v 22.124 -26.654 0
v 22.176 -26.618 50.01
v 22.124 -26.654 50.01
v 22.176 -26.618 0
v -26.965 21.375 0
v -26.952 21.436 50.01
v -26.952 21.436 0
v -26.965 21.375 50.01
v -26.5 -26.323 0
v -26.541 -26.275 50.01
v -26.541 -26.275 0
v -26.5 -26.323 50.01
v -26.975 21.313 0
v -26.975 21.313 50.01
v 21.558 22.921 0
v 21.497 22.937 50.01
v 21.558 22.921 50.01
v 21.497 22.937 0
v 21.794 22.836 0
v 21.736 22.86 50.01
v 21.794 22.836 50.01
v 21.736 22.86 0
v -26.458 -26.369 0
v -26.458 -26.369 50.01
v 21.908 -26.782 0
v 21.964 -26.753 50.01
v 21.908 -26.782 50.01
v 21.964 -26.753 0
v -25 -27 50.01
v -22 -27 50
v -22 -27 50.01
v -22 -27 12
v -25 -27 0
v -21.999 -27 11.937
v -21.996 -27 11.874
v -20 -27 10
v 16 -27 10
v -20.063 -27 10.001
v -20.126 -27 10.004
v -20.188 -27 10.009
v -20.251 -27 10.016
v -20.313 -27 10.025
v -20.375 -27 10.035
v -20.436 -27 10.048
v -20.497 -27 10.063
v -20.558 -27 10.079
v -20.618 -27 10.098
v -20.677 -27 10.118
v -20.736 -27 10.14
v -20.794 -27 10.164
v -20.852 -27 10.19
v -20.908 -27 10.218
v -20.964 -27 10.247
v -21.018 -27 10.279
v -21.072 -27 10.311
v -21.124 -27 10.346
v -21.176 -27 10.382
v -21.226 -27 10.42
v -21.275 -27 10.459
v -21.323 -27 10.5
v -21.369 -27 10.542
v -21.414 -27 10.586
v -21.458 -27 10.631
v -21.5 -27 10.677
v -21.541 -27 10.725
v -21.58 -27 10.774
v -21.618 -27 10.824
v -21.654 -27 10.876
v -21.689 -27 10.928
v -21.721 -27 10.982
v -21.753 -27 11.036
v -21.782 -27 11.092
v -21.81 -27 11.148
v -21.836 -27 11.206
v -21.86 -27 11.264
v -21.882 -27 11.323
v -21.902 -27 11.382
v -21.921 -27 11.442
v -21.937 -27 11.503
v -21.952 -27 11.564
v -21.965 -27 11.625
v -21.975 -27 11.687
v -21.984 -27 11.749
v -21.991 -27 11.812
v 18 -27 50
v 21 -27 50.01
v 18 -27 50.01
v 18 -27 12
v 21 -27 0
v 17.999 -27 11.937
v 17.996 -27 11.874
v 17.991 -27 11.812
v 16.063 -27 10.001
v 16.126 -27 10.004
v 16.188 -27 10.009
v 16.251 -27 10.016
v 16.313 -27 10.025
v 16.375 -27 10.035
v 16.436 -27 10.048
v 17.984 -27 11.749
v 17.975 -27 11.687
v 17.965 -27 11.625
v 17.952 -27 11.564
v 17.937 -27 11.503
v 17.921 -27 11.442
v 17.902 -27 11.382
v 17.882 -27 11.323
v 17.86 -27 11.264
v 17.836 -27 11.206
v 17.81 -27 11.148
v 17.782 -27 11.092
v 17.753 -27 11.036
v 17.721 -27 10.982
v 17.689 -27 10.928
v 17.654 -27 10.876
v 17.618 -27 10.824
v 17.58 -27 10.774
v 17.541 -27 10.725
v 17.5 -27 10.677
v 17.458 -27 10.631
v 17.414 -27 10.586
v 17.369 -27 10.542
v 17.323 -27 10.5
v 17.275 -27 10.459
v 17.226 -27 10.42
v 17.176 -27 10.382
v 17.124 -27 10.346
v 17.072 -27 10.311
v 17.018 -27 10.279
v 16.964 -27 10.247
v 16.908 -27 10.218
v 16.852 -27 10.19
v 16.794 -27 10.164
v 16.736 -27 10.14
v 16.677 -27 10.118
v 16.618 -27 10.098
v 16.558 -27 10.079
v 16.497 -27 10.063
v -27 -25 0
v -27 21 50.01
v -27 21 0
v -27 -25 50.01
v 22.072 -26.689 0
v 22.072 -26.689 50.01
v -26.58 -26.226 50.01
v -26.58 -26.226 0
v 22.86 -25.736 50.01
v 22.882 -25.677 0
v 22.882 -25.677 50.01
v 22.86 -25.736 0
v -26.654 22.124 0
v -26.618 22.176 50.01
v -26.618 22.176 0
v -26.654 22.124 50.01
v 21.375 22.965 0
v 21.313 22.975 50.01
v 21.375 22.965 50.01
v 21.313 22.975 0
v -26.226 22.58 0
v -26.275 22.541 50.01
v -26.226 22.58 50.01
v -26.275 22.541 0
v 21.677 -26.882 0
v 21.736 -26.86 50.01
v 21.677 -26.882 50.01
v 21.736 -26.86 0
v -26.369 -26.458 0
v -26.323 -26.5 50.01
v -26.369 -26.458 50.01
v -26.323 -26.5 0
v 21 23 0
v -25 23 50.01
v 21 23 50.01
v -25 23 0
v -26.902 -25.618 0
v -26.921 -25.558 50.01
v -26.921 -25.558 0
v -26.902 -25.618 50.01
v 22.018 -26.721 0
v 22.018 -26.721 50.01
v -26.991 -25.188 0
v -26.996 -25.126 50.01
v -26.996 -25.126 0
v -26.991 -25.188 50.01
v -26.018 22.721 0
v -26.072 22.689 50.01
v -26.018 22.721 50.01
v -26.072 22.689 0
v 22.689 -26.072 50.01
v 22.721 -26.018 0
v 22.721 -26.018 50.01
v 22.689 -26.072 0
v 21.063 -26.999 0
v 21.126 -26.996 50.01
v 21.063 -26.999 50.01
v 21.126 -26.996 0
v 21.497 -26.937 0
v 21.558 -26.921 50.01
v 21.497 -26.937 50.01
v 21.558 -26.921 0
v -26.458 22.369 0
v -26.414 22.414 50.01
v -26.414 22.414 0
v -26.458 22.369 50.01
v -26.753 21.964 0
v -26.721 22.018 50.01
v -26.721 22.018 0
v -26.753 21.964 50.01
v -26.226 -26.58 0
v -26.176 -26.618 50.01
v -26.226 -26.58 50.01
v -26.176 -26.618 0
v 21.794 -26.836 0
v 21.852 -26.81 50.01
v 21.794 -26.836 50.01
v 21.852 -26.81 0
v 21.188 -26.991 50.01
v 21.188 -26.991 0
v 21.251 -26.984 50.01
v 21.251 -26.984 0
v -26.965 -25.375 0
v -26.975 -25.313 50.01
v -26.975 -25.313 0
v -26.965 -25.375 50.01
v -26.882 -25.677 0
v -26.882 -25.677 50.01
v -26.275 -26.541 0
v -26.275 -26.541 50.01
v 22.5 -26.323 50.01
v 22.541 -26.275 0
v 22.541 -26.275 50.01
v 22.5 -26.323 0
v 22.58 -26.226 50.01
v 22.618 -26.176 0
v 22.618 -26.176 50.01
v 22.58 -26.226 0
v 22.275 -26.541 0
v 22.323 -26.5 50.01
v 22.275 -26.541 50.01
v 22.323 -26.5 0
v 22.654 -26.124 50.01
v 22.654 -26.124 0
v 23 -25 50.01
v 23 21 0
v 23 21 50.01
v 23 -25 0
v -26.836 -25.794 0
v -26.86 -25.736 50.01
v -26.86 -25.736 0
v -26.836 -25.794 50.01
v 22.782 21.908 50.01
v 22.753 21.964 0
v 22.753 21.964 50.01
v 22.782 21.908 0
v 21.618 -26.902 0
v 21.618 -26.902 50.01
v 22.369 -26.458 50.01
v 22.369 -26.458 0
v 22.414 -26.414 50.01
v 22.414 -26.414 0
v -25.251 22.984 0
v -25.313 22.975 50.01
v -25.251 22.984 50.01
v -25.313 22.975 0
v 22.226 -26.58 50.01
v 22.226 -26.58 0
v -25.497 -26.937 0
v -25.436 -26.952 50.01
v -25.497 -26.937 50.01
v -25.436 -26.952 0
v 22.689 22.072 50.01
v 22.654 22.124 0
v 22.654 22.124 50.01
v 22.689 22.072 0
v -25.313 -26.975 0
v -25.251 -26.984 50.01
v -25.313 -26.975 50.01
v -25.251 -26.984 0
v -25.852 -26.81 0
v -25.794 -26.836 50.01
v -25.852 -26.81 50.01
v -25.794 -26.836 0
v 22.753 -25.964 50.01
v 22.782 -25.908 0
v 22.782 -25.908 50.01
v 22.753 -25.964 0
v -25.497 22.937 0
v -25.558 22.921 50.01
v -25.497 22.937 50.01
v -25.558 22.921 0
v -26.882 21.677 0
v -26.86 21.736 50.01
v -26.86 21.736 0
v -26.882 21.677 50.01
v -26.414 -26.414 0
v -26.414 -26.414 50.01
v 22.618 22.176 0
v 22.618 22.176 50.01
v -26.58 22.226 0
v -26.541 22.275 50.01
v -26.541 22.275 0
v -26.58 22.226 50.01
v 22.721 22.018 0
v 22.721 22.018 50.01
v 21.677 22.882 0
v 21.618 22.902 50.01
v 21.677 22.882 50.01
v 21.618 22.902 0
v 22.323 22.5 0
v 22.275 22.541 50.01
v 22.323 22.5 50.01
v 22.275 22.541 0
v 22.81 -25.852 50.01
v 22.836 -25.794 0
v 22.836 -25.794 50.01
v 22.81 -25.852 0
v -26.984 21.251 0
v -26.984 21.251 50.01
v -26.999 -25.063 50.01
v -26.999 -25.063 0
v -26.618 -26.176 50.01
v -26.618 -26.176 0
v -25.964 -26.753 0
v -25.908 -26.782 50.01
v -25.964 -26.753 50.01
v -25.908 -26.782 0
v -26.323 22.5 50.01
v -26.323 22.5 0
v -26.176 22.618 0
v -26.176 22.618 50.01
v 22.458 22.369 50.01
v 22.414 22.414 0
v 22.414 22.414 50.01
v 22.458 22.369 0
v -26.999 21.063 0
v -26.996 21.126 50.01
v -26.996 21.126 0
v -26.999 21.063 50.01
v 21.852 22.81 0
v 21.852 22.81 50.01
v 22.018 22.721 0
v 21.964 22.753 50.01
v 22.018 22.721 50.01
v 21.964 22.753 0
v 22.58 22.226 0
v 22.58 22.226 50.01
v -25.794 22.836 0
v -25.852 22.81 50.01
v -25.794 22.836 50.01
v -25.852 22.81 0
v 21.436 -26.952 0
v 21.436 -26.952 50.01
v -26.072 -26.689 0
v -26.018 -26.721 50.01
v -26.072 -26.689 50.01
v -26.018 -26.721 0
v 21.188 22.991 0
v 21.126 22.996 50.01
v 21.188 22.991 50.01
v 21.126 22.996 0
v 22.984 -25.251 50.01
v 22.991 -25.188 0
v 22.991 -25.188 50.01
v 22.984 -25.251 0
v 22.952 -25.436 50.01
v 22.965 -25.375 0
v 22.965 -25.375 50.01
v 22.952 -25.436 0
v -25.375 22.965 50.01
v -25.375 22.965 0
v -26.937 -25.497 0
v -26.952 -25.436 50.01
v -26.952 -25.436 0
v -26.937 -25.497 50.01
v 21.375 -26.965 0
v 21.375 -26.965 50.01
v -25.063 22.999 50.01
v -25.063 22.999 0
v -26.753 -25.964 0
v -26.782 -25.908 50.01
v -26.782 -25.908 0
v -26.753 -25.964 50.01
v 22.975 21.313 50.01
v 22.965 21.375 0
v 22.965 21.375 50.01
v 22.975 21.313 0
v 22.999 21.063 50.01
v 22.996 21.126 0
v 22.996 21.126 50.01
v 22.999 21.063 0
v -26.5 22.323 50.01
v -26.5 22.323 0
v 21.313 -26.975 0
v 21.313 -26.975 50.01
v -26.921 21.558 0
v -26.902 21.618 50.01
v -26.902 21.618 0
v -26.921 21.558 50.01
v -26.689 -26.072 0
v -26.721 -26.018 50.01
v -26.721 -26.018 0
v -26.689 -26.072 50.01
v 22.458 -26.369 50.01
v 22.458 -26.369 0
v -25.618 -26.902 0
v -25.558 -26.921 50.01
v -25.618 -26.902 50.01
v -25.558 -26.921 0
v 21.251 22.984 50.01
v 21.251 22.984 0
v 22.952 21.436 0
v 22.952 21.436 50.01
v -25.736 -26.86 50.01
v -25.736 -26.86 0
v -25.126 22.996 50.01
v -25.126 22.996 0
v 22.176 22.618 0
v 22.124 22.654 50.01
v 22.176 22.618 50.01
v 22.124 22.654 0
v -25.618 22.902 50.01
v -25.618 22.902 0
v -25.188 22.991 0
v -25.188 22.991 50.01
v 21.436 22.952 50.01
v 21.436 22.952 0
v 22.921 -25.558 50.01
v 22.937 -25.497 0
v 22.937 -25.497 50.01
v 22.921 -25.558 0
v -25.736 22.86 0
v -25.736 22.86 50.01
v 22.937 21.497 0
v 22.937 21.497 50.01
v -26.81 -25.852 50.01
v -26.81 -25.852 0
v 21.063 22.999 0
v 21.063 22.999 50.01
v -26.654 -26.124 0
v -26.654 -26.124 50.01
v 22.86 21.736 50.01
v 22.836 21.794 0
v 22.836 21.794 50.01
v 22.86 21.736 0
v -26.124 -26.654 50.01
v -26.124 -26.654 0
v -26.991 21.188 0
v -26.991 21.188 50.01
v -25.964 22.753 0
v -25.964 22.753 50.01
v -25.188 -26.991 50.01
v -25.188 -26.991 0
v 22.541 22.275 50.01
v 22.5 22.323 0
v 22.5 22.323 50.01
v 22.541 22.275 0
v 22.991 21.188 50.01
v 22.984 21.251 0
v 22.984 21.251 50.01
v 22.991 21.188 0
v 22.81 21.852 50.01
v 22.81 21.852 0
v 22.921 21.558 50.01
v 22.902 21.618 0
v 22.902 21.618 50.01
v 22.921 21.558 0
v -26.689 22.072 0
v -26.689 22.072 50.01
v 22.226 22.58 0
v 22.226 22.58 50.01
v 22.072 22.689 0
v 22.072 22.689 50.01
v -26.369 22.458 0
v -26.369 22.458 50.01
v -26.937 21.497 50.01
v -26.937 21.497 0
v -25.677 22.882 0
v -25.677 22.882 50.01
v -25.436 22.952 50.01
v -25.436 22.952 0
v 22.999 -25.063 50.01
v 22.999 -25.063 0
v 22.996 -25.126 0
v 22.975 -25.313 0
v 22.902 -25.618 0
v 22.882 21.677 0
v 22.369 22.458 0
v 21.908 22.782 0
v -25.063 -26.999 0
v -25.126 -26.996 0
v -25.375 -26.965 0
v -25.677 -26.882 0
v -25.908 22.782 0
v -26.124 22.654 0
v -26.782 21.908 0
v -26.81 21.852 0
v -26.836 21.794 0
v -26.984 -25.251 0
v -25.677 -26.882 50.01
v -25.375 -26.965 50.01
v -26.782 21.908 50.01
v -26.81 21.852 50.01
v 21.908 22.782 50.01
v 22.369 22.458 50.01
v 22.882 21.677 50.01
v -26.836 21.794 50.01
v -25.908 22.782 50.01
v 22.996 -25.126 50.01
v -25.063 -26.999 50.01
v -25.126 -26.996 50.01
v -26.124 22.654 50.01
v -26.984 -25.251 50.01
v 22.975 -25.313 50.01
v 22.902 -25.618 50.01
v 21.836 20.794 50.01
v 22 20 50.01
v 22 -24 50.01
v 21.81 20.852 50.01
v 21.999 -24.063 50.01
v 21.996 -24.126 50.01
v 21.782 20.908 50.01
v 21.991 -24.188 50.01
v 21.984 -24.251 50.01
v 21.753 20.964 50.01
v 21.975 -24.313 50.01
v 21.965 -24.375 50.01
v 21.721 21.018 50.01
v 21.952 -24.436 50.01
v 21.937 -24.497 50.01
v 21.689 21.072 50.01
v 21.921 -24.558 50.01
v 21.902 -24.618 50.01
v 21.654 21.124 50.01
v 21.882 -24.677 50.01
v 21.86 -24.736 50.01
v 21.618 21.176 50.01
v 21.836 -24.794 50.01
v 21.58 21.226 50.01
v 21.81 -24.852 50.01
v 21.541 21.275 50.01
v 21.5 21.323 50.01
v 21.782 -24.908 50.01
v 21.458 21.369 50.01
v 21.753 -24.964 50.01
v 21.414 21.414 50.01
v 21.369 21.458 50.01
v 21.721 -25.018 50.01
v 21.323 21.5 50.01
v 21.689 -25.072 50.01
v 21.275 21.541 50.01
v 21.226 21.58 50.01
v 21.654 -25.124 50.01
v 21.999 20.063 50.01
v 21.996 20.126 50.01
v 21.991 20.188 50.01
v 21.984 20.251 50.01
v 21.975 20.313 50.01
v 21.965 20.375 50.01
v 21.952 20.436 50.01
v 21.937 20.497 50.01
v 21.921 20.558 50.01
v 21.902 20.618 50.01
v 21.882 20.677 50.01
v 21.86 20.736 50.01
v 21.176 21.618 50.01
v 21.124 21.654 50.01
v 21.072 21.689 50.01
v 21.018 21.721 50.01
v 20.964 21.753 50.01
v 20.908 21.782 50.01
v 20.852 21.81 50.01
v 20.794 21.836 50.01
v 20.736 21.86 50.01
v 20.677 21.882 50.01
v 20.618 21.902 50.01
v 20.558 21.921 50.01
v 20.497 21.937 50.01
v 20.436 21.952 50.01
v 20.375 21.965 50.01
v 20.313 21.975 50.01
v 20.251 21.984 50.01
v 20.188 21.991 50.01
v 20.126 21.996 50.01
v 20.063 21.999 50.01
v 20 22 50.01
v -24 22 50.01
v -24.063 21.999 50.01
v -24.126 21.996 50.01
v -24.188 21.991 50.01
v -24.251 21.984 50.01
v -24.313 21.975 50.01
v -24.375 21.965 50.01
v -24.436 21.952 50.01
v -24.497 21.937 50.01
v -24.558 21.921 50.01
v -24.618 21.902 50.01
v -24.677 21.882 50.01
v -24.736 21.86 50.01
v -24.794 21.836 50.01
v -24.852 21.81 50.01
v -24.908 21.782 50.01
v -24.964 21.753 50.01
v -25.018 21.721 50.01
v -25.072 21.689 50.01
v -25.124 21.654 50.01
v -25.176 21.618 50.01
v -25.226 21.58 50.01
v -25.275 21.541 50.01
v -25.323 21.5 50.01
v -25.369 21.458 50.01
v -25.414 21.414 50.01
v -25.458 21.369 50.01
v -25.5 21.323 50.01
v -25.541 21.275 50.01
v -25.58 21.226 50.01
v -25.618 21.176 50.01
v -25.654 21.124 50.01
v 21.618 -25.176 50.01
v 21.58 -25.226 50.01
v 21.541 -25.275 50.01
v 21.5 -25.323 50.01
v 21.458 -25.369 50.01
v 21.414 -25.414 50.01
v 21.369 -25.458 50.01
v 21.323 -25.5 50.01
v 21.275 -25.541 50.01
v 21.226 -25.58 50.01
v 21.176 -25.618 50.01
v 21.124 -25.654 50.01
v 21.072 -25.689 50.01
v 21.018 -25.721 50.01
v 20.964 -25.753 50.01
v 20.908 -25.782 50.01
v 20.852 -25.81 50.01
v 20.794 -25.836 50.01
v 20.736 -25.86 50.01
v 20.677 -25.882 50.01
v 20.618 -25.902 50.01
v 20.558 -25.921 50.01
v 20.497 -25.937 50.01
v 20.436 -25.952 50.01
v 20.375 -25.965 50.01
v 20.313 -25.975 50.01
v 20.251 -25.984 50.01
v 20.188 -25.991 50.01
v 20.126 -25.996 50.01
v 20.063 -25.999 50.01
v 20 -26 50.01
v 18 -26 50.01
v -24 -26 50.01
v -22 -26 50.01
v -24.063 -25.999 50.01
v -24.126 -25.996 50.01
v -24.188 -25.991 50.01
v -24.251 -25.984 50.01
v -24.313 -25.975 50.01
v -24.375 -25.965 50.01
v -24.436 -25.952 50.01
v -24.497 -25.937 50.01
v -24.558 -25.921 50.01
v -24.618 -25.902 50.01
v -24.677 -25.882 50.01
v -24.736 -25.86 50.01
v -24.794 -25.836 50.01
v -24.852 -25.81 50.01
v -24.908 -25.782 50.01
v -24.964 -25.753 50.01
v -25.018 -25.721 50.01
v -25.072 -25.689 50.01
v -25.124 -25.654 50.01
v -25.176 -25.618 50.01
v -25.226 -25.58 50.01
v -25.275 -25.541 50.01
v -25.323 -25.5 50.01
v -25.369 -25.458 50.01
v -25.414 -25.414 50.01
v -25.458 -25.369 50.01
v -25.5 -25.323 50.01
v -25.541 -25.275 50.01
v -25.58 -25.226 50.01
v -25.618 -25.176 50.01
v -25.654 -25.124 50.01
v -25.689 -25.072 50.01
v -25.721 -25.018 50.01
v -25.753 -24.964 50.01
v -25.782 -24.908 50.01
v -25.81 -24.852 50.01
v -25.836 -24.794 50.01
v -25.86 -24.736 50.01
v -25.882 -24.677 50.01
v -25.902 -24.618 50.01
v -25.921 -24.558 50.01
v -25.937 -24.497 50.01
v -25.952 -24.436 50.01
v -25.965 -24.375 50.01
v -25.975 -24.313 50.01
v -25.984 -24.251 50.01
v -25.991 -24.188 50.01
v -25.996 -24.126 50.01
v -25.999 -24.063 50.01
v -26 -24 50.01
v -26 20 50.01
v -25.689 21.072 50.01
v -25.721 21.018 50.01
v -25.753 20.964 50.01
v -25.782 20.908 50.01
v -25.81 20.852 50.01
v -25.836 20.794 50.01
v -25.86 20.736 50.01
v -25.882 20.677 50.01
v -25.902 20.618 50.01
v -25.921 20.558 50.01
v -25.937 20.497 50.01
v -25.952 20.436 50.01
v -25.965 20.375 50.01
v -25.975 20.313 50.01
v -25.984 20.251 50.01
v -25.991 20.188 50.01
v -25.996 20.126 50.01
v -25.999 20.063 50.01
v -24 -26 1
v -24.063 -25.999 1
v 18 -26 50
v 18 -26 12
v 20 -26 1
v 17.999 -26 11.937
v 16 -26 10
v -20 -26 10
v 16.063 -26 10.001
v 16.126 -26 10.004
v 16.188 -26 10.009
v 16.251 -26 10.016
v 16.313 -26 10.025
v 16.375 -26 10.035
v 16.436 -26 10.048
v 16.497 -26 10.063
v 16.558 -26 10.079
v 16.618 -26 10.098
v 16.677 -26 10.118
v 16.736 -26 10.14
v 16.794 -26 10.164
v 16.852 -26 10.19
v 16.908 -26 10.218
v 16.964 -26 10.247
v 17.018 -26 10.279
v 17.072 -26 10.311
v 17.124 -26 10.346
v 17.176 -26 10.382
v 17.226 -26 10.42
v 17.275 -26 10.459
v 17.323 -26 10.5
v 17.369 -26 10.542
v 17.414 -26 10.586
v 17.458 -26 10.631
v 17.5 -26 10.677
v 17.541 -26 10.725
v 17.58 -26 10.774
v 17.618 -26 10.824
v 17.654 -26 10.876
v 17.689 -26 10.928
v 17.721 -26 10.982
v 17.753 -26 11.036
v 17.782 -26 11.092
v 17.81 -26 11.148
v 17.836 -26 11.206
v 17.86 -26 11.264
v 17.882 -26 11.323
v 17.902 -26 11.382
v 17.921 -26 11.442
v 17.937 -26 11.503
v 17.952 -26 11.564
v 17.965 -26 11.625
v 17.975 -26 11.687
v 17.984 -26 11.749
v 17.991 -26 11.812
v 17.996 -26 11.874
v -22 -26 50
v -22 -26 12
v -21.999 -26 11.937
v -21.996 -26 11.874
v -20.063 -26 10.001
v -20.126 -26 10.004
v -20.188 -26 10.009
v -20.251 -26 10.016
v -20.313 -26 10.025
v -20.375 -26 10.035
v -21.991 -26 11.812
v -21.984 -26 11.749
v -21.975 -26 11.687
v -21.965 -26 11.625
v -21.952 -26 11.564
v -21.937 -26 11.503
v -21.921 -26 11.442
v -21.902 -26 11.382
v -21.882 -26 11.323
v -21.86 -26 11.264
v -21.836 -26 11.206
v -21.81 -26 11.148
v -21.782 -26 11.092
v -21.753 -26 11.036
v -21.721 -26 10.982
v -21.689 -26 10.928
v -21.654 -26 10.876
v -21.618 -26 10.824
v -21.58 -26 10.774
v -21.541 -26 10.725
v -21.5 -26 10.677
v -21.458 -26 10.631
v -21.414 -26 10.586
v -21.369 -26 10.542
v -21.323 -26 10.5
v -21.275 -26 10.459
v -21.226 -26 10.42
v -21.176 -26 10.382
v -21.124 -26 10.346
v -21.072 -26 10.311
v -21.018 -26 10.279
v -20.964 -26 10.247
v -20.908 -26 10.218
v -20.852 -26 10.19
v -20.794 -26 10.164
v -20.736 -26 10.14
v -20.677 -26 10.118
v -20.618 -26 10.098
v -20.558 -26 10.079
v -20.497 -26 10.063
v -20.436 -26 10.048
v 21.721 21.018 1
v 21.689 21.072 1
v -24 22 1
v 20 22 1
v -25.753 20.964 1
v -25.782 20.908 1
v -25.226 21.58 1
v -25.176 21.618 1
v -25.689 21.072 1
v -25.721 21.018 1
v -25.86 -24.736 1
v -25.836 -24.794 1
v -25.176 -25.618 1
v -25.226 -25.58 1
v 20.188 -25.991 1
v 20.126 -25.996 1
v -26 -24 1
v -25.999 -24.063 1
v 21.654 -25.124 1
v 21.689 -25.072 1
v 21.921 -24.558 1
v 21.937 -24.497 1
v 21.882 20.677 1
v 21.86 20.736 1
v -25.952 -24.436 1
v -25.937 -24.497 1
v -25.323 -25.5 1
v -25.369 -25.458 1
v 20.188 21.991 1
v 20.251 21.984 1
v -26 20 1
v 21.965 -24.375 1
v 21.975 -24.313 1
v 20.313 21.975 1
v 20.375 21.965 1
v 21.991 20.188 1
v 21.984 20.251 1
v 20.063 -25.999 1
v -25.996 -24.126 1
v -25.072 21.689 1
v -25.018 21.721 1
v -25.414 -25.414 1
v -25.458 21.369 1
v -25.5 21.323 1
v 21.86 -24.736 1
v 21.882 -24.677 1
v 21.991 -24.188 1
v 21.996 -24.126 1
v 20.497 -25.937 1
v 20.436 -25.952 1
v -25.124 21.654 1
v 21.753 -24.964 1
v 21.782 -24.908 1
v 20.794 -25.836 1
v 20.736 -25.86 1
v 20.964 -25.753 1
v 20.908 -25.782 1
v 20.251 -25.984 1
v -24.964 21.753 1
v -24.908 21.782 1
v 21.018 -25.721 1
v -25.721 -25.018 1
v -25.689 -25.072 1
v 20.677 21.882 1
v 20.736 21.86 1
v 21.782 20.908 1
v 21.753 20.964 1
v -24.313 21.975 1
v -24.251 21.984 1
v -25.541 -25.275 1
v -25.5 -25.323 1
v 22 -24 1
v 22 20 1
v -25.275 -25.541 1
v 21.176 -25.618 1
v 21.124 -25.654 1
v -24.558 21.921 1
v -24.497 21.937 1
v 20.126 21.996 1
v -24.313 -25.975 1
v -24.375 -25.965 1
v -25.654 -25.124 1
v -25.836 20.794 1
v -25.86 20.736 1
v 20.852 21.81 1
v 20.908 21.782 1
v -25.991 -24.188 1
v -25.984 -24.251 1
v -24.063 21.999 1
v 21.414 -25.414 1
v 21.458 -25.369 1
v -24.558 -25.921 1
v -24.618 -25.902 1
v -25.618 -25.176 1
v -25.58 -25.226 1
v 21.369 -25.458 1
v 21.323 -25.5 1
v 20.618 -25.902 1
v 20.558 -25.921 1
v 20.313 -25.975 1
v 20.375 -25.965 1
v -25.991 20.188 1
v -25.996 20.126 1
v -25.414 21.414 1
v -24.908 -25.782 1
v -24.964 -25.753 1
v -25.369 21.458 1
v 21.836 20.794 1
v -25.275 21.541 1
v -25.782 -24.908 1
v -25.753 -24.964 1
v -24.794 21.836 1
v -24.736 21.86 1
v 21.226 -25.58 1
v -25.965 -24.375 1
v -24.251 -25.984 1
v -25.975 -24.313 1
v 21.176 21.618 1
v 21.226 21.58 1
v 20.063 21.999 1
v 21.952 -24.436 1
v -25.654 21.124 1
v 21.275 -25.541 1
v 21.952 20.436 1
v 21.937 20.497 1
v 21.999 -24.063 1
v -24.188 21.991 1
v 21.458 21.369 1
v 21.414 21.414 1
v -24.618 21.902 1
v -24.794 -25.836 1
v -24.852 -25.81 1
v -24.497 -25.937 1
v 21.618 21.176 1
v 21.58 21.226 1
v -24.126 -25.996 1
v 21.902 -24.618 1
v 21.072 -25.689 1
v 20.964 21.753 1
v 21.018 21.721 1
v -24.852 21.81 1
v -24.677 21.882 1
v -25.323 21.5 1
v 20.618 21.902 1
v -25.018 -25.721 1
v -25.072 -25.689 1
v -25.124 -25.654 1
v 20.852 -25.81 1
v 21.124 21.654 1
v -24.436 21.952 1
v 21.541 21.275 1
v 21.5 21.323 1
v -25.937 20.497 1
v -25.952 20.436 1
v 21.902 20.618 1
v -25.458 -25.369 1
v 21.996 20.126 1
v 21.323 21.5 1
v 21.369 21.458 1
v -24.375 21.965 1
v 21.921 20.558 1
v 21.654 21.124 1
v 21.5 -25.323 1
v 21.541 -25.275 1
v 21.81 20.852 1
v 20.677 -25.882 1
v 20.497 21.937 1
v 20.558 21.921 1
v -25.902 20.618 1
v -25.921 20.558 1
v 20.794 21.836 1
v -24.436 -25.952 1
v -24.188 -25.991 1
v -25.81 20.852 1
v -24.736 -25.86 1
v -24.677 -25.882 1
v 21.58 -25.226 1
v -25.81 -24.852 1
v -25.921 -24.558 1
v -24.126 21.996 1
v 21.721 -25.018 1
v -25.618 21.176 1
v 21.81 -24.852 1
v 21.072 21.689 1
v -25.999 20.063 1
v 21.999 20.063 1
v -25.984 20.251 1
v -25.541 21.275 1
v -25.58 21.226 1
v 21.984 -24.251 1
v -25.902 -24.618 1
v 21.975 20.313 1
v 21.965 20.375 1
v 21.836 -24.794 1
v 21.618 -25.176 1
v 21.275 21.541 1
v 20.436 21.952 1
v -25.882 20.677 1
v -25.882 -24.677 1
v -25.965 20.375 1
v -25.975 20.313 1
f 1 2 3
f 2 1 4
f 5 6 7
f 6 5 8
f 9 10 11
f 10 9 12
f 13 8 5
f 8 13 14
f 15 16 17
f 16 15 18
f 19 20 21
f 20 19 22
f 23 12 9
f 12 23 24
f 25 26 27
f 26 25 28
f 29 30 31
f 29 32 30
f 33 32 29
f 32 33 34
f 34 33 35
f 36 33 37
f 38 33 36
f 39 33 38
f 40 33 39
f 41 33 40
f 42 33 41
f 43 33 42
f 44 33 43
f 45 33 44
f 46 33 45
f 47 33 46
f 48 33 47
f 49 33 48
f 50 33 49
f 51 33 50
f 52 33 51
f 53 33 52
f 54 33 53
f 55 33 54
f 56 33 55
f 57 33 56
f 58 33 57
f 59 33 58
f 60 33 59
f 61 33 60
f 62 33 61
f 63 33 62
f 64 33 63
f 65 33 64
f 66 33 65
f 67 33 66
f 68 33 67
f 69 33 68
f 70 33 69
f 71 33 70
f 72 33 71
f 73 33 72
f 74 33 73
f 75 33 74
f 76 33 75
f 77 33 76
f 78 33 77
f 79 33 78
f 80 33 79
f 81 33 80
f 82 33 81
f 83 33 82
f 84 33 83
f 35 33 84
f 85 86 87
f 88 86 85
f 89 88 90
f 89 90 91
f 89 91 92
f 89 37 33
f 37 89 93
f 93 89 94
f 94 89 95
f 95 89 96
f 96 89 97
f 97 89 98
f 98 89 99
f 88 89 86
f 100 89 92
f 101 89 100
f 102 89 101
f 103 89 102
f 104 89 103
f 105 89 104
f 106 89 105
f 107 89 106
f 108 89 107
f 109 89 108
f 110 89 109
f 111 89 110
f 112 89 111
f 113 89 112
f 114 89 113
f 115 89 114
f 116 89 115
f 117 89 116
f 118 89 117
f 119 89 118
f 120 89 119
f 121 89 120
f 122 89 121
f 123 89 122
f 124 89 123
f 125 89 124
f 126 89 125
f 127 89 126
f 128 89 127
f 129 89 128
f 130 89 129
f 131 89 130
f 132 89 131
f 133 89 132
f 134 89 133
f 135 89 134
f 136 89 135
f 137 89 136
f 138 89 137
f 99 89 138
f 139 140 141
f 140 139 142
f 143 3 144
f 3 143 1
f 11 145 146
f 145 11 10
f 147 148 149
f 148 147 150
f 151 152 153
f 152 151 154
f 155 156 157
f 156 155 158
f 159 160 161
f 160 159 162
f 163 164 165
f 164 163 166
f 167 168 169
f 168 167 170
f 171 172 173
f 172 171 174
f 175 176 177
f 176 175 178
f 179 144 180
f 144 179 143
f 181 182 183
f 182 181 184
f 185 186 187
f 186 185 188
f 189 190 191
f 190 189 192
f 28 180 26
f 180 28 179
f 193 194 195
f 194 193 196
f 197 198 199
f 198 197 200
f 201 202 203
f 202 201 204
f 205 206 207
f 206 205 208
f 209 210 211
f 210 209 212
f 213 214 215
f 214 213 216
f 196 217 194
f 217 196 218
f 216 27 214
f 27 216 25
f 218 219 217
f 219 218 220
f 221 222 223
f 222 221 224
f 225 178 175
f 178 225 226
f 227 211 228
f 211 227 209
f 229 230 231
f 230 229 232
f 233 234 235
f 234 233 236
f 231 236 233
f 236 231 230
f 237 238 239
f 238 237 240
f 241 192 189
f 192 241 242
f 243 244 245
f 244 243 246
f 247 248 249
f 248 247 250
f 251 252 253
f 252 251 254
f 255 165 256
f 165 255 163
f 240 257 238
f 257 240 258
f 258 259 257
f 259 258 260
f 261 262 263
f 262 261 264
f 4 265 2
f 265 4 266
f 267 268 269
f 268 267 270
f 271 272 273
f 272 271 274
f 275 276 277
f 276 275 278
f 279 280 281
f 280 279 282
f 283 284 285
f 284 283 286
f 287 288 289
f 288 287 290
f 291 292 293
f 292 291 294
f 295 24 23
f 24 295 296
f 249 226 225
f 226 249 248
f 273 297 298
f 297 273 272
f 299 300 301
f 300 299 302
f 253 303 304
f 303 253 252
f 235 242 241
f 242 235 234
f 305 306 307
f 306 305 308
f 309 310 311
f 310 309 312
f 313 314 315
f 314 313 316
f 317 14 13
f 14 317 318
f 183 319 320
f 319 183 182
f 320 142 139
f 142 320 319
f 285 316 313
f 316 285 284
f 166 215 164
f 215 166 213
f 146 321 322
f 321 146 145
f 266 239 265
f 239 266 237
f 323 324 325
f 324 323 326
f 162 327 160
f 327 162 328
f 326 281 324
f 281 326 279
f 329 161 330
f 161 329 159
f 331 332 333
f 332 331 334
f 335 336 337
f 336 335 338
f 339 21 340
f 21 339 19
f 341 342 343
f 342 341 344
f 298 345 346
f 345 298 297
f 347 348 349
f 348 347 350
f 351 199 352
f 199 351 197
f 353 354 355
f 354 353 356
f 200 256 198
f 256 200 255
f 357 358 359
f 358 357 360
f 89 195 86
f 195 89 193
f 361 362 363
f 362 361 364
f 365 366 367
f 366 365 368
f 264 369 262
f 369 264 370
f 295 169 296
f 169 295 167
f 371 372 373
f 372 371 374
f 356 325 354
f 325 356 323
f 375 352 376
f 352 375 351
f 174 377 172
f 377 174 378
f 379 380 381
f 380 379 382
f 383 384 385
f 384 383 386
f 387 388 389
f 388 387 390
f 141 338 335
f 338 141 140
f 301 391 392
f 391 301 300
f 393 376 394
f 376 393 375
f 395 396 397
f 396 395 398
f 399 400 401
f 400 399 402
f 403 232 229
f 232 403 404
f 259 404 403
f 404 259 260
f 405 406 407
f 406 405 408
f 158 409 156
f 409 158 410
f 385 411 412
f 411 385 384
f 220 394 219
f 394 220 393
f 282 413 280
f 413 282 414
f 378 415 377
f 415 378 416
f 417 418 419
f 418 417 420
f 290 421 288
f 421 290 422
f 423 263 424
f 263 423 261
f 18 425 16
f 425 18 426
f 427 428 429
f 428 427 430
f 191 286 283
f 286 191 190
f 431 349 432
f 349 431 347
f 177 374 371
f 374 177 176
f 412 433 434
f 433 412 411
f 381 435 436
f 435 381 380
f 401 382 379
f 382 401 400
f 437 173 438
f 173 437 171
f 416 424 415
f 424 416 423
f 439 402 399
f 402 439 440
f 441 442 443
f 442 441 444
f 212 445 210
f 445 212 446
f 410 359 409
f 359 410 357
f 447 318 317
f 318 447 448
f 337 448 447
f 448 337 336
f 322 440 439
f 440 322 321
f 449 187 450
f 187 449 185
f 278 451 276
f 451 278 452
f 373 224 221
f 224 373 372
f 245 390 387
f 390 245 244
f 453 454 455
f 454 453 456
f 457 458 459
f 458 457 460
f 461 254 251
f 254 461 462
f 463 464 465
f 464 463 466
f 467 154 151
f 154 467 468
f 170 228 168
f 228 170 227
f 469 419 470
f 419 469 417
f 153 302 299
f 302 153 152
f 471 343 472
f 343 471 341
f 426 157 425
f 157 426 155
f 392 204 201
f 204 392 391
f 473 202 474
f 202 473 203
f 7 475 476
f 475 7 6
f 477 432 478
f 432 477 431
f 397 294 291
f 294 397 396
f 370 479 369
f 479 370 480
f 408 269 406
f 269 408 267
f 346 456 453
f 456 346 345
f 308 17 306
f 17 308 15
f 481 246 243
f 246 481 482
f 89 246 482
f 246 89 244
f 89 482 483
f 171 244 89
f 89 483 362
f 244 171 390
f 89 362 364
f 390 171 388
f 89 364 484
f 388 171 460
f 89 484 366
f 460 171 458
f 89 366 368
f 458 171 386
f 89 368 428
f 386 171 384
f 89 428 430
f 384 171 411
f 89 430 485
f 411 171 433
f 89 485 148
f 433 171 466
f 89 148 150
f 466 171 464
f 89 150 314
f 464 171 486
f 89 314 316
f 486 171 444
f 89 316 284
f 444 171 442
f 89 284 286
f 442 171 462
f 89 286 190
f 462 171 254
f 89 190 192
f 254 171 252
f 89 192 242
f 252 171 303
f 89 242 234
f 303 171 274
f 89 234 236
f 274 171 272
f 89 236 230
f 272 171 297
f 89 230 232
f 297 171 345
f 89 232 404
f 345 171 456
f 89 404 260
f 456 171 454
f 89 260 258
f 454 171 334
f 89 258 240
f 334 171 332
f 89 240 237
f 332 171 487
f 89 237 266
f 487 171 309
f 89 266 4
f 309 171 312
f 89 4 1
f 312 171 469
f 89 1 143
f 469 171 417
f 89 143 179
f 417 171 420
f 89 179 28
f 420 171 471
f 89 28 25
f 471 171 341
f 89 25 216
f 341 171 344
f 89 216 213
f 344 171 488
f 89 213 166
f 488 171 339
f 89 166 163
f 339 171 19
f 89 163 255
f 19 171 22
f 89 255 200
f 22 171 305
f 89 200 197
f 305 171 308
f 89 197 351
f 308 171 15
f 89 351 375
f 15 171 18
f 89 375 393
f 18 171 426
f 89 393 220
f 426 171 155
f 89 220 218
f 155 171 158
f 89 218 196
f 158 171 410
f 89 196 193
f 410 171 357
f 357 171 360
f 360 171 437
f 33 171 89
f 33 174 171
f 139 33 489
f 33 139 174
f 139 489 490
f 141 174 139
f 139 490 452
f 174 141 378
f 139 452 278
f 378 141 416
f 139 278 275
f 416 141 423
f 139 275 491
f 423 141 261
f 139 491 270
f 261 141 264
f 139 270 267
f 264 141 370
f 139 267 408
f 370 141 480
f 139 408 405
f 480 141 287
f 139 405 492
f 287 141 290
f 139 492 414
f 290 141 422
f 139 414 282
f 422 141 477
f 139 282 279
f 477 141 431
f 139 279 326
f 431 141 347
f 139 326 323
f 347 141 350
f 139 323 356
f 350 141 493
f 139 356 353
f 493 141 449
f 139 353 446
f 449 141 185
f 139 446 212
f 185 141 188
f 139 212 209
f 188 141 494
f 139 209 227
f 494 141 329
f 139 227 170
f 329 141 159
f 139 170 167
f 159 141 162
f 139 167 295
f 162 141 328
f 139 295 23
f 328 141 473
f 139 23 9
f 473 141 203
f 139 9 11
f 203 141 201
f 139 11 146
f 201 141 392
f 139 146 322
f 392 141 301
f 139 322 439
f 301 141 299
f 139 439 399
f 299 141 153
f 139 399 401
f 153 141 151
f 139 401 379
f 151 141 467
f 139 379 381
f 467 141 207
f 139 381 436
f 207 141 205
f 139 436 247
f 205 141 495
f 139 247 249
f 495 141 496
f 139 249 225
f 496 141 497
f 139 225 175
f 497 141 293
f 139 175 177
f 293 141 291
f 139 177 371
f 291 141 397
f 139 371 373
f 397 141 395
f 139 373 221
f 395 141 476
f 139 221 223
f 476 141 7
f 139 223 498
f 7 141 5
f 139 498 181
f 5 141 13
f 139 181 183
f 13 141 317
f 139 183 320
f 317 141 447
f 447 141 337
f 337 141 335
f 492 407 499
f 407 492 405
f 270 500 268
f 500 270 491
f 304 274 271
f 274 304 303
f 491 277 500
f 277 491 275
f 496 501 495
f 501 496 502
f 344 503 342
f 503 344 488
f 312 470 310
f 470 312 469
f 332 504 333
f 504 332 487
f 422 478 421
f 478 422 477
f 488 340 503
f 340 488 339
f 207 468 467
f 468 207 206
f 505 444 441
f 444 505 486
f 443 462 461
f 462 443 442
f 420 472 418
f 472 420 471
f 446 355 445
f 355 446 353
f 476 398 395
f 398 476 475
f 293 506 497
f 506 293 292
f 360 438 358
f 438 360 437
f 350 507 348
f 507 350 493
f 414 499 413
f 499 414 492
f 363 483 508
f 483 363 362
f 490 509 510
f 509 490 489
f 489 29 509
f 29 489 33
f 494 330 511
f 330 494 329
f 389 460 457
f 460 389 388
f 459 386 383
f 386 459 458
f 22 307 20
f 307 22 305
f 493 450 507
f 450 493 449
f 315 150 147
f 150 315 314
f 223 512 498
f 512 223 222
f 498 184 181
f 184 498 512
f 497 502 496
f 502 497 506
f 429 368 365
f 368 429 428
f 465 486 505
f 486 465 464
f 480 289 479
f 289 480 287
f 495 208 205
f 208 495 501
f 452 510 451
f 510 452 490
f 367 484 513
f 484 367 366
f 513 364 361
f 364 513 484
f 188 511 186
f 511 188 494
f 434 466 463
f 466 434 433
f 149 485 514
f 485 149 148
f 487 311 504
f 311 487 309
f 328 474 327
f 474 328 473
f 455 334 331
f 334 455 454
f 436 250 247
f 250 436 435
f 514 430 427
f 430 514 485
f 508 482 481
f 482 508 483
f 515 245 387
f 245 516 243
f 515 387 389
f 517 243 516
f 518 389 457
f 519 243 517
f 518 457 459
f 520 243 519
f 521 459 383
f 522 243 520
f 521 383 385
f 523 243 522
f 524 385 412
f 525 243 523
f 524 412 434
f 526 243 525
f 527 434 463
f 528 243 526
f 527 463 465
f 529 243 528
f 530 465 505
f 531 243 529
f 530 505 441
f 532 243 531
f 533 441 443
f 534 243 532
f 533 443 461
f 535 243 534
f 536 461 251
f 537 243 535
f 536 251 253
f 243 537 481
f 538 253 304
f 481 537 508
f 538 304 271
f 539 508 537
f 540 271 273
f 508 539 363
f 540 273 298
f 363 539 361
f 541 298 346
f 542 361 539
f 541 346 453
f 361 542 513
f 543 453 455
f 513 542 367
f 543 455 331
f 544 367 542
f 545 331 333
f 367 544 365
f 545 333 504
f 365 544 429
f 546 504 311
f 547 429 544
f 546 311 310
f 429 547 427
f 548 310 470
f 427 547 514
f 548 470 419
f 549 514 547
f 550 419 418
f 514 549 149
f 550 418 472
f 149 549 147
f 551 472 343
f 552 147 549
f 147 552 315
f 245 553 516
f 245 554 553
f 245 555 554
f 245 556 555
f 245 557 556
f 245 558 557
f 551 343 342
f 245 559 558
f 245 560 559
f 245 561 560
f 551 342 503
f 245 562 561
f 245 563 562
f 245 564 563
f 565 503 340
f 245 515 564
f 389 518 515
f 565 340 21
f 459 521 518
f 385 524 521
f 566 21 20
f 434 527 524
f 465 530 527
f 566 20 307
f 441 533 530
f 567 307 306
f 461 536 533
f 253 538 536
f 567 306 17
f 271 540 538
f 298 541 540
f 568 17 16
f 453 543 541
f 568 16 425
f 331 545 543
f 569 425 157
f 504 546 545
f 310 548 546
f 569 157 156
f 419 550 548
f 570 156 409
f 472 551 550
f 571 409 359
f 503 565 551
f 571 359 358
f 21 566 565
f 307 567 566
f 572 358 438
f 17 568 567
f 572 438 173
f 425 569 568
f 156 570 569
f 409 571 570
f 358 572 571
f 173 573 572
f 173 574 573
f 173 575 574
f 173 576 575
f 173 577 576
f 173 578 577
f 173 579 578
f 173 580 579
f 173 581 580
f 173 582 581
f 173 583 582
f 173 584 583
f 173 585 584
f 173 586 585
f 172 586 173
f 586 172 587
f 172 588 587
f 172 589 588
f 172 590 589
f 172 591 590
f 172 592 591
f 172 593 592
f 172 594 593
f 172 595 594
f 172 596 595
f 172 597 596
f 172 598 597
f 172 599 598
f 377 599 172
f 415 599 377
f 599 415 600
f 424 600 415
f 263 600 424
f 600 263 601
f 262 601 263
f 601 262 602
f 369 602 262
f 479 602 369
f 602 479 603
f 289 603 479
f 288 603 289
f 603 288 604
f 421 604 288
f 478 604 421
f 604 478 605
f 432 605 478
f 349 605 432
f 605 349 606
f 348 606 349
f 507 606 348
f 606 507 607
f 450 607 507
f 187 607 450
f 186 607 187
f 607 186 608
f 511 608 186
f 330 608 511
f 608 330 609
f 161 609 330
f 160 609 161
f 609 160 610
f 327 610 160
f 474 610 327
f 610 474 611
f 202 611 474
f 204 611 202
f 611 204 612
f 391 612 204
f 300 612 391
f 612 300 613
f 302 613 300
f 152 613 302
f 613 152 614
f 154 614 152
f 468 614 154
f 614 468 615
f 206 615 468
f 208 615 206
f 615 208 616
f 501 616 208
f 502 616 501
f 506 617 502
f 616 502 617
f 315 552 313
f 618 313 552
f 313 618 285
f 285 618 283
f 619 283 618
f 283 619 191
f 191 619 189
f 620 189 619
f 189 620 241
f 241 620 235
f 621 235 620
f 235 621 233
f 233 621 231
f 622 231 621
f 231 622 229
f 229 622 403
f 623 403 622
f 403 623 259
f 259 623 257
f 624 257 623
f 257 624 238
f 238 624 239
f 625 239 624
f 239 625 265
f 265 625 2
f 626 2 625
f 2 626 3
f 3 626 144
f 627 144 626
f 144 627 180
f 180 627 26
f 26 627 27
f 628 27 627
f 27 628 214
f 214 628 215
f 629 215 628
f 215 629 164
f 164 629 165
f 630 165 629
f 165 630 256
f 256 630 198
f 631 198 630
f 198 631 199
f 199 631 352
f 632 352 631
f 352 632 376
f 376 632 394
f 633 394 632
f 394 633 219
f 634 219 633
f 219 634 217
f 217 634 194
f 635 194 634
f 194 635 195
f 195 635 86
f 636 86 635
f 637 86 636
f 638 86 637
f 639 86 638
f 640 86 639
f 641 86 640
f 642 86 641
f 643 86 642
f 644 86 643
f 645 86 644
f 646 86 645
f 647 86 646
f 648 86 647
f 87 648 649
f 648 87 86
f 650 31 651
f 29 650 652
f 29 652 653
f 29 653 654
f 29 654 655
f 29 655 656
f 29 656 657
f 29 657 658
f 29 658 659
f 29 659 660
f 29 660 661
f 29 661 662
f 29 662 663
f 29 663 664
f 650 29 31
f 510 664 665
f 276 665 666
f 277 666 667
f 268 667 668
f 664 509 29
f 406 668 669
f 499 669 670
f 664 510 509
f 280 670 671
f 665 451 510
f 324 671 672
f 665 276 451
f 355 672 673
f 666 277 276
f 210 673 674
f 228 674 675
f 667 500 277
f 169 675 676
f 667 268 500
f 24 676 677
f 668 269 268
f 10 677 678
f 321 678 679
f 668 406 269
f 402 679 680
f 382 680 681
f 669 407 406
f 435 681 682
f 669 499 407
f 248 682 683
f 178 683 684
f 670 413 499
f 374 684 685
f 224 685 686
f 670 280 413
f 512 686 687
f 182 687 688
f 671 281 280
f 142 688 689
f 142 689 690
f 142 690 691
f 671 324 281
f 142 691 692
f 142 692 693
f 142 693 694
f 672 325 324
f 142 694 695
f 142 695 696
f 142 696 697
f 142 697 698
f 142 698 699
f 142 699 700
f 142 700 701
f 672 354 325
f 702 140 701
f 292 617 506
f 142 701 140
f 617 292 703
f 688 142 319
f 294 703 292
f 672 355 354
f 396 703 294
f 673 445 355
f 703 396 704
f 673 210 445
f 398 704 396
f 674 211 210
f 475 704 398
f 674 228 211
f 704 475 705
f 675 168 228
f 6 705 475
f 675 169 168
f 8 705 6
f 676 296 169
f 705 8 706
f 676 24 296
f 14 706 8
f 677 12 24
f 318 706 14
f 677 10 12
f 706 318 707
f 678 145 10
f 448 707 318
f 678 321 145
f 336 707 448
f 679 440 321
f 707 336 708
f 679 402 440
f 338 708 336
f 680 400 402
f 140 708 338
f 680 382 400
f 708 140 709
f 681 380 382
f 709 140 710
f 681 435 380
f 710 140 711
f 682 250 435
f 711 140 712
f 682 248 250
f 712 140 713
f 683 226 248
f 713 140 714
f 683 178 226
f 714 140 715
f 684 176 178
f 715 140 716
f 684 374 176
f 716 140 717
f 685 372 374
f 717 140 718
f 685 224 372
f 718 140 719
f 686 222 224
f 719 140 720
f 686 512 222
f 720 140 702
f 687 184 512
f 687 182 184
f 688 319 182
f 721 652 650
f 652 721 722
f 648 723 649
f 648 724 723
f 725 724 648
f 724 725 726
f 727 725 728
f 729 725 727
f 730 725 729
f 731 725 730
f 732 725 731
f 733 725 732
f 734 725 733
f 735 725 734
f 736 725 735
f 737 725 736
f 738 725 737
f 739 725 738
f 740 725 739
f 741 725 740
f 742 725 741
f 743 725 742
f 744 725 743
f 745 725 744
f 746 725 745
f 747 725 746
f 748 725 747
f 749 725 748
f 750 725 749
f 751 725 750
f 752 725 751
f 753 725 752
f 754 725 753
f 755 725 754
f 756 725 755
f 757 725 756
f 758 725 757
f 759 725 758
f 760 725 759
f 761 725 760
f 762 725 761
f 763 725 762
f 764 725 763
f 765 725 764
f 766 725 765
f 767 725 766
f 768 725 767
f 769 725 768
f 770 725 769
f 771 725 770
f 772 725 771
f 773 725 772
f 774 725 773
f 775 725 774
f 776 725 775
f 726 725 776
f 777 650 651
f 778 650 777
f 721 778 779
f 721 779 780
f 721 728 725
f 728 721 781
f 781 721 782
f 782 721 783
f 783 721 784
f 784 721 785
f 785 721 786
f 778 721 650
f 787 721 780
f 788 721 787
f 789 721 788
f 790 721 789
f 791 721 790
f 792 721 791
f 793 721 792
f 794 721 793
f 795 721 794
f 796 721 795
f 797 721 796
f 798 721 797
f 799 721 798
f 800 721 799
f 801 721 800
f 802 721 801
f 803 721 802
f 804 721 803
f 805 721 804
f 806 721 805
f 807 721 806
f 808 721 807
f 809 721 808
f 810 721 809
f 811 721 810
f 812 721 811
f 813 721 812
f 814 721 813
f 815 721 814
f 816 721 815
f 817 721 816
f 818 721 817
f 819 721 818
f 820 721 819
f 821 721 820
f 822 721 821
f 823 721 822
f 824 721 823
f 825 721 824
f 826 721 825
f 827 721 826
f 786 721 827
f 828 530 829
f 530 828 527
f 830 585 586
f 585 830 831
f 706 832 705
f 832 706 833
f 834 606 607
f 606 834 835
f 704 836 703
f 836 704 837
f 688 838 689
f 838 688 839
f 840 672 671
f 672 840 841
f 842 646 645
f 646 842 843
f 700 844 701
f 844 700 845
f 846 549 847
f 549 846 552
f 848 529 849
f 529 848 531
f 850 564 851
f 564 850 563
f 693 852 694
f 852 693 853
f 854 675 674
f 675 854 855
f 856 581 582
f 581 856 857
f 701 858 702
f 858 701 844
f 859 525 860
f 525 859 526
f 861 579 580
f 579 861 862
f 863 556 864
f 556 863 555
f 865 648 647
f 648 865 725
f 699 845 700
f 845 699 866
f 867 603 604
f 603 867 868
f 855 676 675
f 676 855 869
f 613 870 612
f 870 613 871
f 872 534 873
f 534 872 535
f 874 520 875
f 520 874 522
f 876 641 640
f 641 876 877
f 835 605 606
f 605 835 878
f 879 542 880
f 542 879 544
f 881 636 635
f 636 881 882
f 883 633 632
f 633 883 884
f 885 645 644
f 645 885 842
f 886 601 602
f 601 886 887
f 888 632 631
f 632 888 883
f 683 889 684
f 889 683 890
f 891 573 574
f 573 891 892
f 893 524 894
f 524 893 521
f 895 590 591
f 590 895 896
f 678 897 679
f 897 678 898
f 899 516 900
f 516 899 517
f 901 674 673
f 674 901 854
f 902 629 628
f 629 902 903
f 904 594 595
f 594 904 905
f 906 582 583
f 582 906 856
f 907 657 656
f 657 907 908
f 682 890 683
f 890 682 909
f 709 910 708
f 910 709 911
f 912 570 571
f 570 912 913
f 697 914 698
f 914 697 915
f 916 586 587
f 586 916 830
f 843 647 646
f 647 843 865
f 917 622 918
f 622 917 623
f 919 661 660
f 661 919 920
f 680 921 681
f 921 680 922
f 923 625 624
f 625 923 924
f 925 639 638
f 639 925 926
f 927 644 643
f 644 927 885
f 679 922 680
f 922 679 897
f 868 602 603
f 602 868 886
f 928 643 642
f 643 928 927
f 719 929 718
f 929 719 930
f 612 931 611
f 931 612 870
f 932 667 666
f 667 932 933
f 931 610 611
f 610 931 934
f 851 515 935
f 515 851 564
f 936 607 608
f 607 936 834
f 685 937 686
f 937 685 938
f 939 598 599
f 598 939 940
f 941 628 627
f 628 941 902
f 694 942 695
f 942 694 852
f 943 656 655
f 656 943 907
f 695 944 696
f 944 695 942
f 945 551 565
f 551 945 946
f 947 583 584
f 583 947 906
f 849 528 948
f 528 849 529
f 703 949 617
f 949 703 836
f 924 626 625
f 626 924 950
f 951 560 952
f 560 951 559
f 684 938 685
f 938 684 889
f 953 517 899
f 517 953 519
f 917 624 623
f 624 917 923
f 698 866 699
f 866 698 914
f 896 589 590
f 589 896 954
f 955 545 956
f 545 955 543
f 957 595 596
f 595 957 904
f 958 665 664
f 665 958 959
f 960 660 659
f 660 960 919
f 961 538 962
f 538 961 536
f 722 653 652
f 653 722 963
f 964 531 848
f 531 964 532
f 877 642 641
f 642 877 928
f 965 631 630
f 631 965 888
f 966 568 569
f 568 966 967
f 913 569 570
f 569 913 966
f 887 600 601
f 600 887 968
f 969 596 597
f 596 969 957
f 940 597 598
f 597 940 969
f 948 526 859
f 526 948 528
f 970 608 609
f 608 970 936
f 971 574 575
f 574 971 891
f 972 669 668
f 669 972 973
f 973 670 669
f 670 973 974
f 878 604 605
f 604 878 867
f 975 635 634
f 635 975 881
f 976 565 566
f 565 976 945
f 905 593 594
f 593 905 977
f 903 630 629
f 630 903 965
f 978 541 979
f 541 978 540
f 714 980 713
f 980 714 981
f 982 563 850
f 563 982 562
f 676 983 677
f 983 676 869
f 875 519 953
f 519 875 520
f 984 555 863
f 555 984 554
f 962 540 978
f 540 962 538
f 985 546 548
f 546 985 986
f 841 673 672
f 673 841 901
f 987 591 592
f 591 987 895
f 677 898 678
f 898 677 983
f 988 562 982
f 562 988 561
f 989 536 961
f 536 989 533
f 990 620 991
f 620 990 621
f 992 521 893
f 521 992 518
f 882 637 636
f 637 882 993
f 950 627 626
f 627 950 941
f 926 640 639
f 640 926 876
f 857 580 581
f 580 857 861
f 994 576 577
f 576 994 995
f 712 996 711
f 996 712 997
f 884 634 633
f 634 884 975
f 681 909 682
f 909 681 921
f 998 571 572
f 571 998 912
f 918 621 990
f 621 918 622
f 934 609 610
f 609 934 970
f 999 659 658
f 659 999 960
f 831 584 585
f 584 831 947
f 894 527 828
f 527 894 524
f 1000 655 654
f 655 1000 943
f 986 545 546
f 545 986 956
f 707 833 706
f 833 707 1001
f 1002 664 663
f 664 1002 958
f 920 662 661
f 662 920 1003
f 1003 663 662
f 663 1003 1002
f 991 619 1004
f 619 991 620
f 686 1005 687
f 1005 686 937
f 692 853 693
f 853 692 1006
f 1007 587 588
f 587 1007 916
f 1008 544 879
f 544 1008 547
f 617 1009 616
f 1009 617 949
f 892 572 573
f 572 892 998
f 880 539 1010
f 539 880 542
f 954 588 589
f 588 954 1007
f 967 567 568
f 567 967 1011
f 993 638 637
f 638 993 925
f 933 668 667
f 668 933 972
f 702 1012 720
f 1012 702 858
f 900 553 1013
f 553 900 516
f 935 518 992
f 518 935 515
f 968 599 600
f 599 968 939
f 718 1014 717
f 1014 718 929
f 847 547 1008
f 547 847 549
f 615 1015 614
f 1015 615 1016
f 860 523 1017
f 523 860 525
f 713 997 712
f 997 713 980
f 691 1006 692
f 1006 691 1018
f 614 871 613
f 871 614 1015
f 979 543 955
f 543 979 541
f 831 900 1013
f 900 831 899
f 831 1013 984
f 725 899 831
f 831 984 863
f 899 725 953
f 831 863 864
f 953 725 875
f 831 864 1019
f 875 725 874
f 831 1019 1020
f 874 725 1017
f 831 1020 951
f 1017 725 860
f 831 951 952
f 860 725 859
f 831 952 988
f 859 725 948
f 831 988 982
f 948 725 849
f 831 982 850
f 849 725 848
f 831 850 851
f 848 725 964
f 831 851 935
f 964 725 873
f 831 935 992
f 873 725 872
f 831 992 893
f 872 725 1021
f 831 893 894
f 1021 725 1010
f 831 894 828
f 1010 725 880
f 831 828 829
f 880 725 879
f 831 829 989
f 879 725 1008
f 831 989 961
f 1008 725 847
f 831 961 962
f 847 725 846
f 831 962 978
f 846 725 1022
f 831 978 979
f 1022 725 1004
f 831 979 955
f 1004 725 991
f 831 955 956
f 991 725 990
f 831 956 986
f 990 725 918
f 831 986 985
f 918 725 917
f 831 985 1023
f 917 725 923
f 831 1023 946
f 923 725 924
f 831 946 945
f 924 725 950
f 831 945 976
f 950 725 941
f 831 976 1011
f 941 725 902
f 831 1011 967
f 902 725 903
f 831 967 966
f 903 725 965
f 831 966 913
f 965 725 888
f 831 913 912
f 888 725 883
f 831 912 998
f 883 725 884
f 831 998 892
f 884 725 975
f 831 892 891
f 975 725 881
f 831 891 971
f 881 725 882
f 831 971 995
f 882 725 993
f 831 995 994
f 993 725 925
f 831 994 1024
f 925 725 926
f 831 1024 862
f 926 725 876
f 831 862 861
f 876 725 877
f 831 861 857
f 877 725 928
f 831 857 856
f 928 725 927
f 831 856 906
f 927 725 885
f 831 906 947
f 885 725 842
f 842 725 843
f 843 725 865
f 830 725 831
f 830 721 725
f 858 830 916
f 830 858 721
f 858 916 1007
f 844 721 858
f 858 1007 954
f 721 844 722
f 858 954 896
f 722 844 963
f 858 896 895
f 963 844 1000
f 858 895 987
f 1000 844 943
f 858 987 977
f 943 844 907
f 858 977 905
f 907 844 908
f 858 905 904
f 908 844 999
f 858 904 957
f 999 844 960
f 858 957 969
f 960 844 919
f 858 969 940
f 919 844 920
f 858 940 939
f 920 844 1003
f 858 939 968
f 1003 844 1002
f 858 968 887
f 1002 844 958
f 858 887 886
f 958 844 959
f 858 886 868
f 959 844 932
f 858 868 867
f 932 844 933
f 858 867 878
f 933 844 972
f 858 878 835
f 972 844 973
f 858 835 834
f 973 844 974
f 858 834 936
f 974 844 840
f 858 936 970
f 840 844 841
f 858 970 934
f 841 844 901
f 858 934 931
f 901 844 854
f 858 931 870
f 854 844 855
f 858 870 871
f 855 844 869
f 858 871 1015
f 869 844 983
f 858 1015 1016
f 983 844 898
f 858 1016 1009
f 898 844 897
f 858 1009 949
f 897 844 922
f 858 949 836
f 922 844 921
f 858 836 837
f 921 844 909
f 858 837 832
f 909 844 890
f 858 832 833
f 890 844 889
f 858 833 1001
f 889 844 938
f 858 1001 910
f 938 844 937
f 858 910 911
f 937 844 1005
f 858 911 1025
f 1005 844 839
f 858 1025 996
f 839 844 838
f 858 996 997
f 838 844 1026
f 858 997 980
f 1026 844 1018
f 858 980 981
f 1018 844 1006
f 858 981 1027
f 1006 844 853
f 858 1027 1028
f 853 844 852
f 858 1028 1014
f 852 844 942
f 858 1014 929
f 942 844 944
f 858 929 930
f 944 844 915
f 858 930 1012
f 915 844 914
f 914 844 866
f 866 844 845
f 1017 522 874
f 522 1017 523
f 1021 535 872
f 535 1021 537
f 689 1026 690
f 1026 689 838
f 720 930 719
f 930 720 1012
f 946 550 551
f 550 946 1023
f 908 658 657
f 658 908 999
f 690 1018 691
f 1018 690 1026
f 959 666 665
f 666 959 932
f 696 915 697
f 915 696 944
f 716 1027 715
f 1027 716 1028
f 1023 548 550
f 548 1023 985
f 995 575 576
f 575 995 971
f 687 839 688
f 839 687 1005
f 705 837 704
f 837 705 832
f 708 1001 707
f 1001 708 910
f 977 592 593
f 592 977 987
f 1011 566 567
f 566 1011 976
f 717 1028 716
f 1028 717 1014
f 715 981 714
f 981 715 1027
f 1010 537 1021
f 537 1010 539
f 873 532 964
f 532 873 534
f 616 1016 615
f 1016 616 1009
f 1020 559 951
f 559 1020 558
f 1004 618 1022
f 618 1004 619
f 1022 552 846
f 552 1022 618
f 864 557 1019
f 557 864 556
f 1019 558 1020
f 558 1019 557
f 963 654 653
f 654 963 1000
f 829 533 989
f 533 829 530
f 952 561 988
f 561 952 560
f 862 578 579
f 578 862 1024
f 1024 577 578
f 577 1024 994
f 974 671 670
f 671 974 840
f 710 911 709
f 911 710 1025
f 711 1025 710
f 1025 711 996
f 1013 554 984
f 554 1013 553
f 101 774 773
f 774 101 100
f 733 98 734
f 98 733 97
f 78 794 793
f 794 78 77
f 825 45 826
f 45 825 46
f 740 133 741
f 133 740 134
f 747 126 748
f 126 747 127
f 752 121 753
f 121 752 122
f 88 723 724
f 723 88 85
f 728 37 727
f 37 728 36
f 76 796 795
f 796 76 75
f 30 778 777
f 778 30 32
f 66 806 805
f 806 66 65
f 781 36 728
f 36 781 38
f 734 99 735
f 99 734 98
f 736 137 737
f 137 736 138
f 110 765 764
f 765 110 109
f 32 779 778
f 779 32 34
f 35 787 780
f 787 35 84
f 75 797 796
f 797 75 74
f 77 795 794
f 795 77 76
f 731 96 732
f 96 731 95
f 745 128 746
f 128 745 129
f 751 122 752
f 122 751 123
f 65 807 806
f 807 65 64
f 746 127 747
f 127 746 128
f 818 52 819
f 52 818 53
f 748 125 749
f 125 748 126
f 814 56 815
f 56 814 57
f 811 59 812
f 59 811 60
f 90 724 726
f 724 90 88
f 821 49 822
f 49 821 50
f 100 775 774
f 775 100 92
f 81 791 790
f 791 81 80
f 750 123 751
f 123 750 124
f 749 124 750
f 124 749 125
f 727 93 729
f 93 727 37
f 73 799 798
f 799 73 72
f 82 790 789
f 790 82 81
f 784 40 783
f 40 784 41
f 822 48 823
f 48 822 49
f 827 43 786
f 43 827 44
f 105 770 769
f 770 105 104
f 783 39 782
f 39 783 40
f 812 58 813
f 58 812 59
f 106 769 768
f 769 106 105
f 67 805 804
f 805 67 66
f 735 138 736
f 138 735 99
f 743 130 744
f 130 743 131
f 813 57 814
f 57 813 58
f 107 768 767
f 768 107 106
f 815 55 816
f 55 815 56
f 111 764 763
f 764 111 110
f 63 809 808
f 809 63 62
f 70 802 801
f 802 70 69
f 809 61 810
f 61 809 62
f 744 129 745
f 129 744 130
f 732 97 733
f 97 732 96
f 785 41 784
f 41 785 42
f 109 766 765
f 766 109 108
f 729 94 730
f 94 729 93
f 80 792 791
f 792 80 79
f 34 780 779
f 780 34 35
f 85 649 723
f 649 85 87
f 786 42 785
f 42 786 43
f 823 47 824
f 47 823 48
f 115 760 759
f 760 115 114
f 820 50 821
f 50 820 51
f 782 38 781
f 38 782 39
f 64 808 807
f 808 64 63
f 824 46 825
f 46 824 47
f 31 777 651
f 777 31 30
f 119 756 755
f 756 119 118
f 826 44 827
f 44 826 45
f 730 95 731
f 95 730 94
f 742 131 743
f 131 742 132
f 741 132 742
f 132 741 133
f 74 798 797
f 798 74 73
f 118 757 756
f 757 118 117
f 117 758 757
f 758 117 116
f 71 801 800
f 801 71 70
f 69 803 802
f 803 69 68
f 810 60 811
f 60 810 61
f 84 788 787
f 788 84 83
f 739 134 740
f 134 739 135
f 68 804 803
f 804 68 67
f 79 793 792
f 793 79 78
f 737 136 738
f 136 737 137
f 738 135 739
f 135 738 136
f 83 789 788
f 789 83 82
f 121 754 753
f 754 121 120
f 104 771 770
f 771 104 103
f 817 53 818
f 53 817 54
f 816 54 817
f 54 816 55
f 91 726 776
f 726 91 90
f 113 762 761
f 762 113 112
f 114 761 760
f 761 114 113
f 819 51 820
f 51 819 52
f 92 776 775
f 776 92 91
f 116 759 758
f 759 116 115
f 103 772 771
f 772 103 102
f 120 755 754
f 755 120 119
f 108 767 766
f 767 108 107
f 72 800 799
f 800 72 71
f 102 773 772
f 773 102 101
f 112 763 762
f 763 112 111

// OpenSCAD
/*
Step 1
- basic parameters
- $fn - 200 fragments results in a smooth shape
- minkowski is creating a rounded shape, don't forget to exclude the double radius
*/

$fn=200;

// Length
length = 50;
width= 50;
height = 50;
thickness = 1;

cutout_width = 40;
cutout_height = 40;

cornerRadius = 2;

translate([-width/2, -length/2, 0]){
    difference() {
        roundedBox(length, width, height, cornerRadius); 
        translate([thickness,thickness,thickness]) {
            roundedBox(length - (thickness * 2), width - (thickness * 2), height - thickness, cornerRadius); 
        }
        translate([width/2, length/2, 0]) {
            rotate(a=[90,0,0]) {
                translate([(-cutout_width / 2), (height - cutout_height) +  cornerRadius , length / 2]) {
                    roundedBox(cutout_height + cornerRadius, cutout_width, thickness * 2, cornerRadius); 
                }
            }
        }
    }
}

module roundedBox(length, width, height, radius)
{
    dRadius = 2*radius;

    //base rounded shape
    minkowski() {
        cube(size=[width-dRadius,length-dRadius, height]);
        cylinder(r=radius, h=0.01);
    }  
}
